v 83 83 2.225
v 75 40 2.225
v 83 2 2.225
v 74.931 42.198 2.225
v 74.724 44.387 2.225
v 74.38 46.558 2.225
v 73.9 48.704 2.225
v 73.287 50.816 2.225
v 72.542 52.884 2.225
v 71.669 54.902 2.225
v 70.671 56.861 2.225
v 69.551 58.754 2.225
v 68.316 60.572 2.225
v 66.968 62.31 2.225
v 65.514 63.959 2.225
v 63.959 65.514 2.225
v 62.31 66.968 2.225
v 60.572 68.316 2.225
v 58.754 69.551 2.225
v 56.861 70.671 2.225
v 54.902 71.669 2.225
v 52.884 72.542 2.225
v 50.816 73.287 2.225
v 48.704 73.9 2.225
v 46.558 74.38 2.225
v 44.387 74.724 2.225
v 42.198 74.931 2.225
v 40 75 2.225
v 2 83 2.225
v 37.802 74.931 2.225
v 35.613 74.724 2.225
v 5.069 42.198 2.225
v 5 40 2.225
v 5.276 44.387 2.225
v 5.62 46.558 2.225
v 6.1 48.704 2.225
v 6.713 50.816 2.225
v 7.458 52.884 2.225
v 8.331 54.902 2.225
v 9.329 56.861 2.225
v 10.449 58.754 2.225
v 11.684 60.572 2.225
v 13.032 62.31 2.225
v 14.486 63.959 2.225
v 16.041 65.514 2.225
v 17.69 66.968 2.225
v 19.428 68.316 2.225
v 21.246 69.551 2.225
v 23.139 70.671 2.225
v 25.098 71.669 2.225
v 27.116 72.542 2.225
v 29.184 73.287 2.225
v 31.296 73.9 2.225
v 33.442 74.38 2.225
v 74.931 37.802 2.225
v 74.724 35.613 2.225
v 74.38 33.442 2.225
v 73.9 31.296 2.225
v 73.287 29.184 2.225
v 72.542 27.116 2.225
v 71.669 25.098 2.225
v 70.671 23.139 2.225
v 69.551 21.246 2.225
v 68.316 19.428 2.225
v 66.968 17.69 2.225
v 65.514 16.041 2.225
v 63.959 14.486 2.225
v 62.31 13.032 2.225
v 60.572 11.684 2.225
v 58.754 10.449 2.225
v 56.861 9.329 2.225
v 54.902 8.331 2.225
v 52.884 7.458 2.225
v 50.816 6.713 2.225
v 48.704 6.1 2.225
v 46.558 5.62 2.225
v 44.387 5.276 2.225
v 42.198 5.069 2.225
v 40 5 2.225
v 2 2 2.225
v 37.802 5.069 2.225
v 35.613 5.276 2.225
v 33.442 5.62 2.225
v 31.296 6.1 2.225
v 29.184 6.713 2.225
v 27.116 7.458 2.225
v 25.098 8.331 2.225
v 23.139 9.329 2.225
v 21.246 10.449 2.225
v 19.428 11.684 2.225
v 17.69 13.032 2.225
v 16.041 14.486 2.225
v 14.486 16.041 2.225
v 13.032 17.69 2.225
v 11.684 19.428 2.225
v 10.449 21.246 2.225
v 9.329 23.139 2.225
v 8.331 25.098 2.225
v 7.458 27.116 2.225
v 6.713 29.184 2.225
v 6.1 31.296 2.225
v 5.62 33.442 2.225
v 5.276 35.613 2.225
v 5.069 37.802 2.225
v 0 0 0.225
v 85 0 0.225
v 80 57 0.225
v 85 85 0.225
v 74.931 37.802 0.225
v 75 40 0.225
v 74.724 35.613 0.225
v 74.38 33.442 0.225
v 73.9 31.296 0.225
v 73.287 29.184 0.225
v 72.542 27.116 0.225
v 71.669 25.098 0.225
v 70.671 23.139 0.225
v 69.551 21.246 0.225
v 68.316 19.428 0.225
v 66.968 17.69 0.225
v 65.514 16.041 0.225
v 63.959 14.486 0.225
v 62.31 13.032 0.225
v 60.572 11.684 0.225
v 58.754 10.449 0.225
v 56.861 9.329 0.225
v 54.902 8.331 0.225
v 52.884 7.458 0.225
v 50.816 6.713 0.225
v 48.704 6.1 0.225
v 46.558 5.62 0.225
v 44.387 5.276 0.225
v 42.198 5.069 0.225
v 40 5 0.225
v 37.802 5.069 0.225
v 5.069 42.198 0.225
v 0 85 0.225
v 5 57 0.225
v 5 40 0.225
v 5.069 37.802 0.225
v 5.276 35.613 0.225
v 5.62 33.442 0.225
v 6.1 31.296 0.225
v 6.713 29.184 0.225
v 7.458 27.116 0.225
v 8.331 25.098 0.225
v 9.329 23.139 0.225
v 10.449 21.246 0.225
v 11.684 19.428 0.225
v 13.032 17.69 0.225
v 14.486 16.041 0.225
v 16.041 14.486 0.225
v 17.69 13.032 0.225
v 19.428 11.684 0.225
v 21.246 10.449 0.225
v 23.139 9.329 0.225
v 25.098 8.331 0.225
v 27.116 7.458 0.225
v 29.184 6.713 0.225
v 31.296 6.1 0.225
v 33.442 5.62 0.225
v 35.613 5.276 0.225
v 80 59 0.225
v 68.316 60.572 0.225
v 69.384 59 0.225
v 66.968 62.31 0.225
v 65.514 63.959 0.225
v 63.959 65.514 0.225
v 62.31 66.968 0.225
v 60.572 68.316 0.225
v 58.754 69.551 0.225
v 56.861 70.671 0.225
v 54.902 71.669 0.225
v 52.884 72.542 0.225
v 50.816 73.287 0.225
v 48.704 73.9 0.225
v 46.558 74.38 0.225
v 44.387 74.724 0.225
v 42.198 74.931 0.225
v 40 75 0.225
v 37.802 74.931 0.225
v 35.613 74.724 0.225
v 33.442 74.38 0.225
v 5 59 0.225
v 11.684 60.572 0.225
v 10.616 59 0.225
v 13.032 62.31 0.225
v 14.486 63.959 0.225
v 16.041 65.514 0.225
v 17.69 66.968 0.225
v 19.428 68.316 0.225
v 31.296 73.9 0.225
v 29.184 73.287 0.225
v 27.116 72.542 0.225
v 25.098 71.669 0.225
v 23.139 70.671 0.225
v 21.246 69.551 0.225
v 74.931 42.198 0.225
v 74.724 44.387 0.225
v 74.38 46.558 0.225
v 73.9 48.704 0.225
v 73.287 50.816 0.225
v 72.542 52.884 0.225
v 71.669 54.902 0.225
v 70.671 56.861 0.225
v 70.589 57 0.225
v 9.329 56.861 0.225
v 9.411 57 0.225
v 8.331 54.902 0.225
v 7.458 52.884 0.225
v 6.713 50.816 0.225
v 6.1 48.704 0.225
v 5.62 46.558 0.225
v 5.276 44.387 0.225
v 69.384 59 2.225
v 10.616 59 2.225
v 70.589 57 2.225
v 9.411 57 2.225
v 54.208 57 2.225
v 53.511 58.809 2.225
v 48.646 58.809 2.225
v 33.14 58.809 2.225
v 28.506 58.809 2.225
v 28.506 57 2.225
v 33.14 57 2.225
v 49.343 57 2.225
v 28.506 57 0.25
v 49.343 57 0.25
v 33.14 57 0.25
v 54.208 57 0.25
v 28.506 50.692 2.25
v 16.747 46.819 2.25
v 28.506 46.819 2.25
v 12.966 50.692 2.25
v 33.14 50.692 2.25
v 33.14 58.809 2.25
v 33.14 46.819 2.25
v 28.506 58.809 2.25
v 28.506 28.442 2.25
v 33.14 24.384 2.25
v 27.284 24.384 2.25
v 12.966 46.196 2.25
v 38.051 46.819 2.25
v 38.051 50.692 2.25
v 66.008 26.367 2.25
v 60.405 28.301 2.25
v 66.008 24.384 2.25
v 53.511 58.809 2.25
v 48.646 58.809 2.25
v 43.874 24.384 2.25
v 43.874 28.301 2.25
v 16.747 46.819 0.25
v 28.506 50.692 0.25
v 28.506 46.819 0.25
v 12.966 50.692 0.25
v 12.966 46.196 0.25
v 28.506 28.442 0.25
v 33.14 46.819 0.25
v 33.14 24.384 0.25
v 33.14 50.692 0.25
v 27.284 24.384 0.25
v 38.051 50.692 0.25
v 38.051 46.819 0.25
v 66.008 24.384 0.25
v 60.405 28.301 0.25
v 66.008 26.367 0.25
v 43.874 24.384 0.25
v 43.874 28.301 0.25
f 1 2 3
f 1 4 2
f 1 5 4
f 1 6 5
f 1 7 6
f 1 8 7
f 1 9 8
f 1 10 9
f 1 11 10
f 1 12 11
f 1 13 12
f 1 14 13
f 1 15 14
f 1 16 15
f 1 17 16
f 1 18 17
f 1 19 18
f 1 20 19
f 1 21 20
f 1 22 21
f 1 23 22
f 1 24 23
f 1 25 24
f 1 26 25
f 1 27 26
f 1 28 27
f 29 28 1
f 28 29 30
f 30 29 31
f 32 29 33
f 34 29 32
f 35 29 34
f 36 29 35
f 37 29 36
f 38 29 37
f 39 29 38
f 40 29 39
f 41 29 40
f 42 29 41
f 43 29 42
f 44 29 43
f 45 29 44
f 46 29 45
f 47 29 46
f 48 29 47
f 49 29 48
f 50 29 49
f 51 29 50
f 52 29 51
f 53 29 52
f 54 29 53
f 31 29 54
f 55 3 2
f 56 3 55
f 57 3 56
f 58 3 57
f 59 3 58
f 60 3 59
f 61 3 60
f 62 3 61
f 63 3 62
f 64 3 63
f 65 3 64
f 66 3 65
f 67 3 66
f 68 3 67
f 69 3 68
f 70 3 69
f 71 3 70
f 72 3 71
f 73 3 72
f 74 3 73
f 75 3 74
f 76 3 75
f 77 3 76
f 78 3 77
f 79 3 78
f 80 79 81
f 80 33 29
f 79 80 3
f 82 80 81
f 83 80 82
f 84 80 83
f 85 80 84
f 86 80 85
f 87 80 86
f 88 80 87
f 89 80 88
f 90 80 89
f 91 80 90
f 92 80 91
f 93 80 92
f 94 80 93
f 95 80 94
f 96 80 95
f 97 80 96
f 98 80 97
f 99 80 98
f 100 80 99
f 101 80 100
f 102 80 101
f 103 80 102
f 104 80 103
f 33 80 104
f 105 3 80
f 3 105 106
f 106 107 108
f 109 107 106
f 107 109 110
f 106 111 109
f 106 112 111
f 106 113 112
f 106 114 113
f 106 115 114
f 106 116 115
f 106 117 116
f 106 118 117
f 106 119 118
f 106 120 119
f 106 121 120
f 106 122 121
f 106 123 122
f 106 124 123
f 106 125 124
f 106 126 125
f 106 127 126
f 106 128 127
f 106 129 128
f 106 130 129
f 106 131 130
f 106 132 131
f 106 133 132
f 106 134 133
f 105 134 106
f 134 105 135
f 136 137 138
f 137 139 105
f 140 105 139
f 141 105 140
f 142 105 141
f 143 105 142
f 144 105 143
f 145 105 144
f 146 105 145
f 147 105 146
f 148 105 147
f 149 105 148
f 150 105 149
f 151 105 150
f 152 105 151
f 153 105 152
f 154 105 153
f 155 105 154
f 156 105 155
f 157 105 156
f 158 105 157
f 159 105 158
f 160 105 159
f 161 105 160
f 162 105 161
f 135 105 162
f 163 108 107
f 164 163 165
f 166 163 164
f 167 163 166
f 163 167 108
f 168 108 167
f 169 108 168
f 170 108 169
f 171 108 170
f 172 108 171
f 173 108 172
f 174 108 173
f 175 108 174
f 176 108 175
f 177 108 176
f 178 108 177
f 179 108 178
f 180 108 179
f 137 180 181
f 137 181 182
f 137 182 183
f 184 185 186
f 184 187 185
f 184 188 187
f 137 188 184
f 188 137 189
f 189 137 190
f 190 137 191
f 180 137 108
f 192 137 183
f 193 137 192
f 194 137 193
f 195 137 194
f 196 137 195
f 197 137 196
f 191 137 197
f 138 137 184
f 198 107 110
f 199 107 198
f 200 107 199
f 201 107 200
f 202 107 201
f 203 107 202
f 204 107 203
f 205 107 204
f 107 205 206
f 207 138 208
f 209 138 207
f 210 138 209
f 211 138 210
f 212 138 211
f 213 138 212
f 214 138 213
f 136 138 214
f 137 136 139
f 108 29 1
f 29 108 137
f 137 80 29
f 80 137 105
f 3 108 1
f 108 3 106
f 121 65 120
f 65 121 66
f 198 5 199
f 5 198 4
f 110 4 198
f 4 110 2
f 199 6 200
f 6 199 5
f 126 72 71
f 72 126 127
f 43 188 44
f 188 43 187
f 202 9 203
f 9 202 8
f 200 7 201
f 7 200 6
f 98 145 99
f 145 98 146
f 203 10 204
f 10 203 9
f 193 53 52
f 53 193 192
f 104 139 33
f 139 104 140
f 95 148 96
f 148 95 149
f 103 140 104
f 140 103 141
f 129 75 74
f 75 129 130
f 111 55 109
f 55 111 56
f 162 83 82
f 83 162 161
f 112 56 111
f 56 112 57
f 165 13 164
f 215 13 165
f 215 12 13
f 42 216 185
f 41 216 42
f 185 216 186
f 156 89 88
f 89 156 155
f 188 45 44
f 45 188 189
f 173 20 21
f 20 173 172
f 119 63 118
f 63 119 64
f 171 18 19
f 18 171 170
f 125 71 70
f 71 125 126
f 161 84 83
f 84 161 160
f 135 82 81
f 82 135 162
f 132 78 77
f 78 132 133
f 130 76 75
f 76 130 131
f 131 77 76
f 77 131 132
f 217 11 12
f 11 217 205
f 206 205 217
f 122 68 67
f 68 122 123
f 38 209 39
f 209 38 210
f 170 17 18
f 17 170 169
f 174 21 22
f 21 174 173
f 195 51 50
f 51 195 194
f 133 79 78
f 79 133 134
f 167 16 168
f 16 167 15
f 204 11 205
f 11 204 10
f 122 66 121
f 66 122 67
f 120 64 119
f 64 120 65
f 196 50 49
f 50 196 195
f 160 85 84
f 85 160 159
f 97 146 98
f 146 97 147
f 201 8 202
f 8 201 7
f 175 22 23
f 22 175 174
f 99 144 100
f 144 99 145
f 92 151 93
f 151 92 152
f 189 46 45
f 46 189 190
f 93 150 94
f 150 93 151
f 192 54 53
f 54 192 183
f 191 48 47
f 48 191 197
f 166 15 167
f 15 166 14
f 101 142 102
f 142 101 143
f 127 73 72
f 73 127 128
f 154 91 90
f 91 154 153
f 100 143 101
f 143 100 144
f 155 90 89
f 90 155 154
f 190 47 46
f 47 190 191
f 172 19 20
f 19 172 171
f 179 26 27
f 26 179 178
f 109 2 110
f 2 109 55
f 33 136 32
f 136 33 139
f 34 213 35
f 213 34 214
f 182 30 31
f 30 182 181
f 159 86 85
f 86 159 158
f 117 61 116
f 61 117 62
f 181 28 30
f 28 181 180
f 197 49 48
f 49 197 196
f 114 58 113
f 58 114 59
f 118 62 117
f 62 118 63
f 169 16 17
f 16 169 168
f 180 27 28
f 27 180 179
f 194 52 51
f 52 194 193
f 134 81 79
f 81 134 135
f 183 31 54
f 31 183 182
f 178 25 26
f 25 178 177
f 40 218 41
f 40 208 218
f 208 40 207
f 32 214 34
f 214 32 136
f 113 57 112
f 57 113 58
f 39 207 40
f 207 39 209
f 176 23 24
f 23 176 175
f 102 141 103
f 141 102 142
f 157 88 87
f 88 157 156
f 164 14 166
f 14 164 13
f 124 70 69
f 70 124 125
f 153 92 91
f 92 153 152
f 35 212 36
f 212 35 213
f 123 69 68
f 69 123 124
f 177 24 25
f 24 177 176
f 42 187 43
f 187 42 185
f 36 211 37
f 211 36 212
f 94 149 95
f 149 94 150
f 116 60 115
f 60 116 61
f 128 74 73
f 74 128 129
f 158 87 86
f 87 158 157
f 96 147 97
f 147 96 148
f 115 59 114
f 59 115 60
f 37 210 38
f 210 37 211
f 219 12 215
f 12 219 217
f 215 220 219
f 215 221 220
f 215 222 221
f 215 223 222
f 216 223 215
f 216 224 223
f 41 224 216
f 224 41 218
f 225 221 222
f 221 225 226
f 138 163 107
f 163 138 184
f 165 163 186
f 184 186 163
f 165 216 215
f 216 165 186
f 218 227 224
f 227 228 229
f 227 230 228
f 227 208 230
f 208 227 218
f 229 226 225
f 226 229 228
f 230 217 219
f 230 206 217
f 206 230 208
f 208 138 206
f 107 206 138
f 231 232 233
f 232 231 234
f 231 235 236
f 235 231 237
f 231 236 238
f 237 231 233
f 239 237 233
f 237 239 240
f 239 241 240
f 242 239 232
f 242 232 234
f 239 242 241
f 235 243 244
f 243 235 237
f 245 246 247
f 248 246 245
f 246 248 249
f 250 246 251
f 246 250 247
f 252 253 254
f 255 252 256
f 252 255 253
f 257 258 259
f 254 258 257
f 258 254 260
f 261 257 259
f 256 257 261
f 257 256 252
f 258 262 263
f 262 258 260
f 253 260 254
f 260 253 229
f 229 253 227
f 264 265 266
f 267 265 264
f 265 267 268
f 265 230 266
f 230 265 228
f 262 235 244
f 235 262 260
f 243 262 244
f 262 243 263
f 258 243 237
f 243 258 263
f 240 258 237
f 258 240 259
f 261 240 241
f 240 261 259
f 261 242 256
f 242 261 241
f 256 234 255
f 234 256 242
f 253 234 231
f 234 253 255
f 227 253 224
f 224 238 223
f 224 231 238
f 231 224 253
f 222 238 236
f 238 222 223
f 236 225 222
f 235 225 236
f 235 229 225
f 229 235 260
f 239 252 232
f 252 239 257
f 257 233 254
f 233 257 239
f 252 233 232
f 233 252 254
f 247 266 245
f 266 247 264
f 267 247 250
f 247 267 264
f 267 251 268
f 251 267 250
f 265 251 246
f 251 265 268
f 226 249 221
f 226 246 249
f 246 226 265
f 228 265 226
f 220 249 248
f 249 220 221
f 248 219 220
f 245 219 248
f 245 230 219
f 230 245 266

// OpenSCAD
//use numeric variable to move the bar up and down 

//enter the anniversary (2 digit)
text_box = "47";
module plate(scale) {polyhedron(
 points=[[83.00000000000014,2.000000000000113,2.2250053518819857],[2.0000000000002305,83.00000000000033,2.2250053518820816],[2.0000000000000075,2.0000000000002256,2.22500535188211],[2.0000000000002305,83.00000000000033,2.2250053518820816],[83.00000000000014,2.000000000000113,2.2250053518819857],[83.00000000000034,83.00000000000026,2.225005351882025],[85.00000000000024,1.3535839116229907e-13,0.22500535188194992],[2.0000000000000075,2.0000000000002256,2.22500535188211],[0.0,0.0,0.22500535188208526],[2.0000000000000075,2.0000000000002256,2.22500535188211],[85.00000000000024,1.3535839116229907e-13,0.22500535188194992],[83.00000000000014,2.000000000000113,2.2250053518819857],[2.425171174991192e-13,85.00000000000037,0.22500535188207962],[85.00000000000024,1.3535839116229907e-13,0.22500535188194992],[0.0,0.0,0.22500535188208526],[85.00000000000024,1.3535839116229907e-13,0.22500535188194992],[2.425171174991192e-13,85.00000000000037,0.22500535188207962],[85.00000000000048,85.00000000000027,0.22500535188197246],[2.0000000000002305,83.00000000000033,2.2250053518820816],[85.00000000000048,85.00000000000027,0.22500535188197246],[2.425171174991192e-13,85.00000000000037,0.22500535188207962],[85.00000000000048,85.00000000000027,0.22500535188197246],[2.0000000000002305,83.00000000000033,2.2250053518820816],[83.00000000000034,83.00000000000026,2.225005351882025],[2.0000000000000075,2.0000000000002256,2.22500535188211],[2.425171174991192e-13,85.00000000000037,0.22500535188207962],[0.0,0.0,0.22500535188208526],[2.425171174991192e-13,85.00000000000037,0.22500535188207962],[2.0000000000000075,2.0000000000002256,2.22500535188211],[2.0000000000002305,83.00000000000033,2.2250053518820816],[85.00000000000024,1.3535839116229907e-13,0.22500535188194992],[83.00000000000034,83.00000000000026,2.225005351882025],[83.00000000000014,2.000000000000113,2.2250053518819857],[83.00000000000034,83.00000000000026,2.225005351882025],[85.00000000000024,1.3535839116229907e-13,0.22500535188194992],[85.00000000000048,85.00000000000027,0.22500535188197246] ],
faces=[[0,1,2],[3,4,5],[6,7,8],[9,10,11],[12,13,14],[15,16,17],[18,19,20],[21,22,23],[24,25,26],[27,28,29],[30,31,32],[33,34,35]]);}





difference(1) {
plate(1);
translate ([40,40,0])
cylinder (h = 12, r=35, center = true, $fn=100);
}
translate ([5,57,.225])
cube([75,2,2] );

// text(scale) {
font1 = "Archivo Black"; // here you can select other font type
content = (str(text_box));

translate ([40,42,2.25]) {
rotate ([180,0,0]) {
linear_extrude(height = 2) {
text(content, font = font1, size = 34, halign="center", valign="center", direction = "ltr", spacing = 1 );
    ;
}
}
}
